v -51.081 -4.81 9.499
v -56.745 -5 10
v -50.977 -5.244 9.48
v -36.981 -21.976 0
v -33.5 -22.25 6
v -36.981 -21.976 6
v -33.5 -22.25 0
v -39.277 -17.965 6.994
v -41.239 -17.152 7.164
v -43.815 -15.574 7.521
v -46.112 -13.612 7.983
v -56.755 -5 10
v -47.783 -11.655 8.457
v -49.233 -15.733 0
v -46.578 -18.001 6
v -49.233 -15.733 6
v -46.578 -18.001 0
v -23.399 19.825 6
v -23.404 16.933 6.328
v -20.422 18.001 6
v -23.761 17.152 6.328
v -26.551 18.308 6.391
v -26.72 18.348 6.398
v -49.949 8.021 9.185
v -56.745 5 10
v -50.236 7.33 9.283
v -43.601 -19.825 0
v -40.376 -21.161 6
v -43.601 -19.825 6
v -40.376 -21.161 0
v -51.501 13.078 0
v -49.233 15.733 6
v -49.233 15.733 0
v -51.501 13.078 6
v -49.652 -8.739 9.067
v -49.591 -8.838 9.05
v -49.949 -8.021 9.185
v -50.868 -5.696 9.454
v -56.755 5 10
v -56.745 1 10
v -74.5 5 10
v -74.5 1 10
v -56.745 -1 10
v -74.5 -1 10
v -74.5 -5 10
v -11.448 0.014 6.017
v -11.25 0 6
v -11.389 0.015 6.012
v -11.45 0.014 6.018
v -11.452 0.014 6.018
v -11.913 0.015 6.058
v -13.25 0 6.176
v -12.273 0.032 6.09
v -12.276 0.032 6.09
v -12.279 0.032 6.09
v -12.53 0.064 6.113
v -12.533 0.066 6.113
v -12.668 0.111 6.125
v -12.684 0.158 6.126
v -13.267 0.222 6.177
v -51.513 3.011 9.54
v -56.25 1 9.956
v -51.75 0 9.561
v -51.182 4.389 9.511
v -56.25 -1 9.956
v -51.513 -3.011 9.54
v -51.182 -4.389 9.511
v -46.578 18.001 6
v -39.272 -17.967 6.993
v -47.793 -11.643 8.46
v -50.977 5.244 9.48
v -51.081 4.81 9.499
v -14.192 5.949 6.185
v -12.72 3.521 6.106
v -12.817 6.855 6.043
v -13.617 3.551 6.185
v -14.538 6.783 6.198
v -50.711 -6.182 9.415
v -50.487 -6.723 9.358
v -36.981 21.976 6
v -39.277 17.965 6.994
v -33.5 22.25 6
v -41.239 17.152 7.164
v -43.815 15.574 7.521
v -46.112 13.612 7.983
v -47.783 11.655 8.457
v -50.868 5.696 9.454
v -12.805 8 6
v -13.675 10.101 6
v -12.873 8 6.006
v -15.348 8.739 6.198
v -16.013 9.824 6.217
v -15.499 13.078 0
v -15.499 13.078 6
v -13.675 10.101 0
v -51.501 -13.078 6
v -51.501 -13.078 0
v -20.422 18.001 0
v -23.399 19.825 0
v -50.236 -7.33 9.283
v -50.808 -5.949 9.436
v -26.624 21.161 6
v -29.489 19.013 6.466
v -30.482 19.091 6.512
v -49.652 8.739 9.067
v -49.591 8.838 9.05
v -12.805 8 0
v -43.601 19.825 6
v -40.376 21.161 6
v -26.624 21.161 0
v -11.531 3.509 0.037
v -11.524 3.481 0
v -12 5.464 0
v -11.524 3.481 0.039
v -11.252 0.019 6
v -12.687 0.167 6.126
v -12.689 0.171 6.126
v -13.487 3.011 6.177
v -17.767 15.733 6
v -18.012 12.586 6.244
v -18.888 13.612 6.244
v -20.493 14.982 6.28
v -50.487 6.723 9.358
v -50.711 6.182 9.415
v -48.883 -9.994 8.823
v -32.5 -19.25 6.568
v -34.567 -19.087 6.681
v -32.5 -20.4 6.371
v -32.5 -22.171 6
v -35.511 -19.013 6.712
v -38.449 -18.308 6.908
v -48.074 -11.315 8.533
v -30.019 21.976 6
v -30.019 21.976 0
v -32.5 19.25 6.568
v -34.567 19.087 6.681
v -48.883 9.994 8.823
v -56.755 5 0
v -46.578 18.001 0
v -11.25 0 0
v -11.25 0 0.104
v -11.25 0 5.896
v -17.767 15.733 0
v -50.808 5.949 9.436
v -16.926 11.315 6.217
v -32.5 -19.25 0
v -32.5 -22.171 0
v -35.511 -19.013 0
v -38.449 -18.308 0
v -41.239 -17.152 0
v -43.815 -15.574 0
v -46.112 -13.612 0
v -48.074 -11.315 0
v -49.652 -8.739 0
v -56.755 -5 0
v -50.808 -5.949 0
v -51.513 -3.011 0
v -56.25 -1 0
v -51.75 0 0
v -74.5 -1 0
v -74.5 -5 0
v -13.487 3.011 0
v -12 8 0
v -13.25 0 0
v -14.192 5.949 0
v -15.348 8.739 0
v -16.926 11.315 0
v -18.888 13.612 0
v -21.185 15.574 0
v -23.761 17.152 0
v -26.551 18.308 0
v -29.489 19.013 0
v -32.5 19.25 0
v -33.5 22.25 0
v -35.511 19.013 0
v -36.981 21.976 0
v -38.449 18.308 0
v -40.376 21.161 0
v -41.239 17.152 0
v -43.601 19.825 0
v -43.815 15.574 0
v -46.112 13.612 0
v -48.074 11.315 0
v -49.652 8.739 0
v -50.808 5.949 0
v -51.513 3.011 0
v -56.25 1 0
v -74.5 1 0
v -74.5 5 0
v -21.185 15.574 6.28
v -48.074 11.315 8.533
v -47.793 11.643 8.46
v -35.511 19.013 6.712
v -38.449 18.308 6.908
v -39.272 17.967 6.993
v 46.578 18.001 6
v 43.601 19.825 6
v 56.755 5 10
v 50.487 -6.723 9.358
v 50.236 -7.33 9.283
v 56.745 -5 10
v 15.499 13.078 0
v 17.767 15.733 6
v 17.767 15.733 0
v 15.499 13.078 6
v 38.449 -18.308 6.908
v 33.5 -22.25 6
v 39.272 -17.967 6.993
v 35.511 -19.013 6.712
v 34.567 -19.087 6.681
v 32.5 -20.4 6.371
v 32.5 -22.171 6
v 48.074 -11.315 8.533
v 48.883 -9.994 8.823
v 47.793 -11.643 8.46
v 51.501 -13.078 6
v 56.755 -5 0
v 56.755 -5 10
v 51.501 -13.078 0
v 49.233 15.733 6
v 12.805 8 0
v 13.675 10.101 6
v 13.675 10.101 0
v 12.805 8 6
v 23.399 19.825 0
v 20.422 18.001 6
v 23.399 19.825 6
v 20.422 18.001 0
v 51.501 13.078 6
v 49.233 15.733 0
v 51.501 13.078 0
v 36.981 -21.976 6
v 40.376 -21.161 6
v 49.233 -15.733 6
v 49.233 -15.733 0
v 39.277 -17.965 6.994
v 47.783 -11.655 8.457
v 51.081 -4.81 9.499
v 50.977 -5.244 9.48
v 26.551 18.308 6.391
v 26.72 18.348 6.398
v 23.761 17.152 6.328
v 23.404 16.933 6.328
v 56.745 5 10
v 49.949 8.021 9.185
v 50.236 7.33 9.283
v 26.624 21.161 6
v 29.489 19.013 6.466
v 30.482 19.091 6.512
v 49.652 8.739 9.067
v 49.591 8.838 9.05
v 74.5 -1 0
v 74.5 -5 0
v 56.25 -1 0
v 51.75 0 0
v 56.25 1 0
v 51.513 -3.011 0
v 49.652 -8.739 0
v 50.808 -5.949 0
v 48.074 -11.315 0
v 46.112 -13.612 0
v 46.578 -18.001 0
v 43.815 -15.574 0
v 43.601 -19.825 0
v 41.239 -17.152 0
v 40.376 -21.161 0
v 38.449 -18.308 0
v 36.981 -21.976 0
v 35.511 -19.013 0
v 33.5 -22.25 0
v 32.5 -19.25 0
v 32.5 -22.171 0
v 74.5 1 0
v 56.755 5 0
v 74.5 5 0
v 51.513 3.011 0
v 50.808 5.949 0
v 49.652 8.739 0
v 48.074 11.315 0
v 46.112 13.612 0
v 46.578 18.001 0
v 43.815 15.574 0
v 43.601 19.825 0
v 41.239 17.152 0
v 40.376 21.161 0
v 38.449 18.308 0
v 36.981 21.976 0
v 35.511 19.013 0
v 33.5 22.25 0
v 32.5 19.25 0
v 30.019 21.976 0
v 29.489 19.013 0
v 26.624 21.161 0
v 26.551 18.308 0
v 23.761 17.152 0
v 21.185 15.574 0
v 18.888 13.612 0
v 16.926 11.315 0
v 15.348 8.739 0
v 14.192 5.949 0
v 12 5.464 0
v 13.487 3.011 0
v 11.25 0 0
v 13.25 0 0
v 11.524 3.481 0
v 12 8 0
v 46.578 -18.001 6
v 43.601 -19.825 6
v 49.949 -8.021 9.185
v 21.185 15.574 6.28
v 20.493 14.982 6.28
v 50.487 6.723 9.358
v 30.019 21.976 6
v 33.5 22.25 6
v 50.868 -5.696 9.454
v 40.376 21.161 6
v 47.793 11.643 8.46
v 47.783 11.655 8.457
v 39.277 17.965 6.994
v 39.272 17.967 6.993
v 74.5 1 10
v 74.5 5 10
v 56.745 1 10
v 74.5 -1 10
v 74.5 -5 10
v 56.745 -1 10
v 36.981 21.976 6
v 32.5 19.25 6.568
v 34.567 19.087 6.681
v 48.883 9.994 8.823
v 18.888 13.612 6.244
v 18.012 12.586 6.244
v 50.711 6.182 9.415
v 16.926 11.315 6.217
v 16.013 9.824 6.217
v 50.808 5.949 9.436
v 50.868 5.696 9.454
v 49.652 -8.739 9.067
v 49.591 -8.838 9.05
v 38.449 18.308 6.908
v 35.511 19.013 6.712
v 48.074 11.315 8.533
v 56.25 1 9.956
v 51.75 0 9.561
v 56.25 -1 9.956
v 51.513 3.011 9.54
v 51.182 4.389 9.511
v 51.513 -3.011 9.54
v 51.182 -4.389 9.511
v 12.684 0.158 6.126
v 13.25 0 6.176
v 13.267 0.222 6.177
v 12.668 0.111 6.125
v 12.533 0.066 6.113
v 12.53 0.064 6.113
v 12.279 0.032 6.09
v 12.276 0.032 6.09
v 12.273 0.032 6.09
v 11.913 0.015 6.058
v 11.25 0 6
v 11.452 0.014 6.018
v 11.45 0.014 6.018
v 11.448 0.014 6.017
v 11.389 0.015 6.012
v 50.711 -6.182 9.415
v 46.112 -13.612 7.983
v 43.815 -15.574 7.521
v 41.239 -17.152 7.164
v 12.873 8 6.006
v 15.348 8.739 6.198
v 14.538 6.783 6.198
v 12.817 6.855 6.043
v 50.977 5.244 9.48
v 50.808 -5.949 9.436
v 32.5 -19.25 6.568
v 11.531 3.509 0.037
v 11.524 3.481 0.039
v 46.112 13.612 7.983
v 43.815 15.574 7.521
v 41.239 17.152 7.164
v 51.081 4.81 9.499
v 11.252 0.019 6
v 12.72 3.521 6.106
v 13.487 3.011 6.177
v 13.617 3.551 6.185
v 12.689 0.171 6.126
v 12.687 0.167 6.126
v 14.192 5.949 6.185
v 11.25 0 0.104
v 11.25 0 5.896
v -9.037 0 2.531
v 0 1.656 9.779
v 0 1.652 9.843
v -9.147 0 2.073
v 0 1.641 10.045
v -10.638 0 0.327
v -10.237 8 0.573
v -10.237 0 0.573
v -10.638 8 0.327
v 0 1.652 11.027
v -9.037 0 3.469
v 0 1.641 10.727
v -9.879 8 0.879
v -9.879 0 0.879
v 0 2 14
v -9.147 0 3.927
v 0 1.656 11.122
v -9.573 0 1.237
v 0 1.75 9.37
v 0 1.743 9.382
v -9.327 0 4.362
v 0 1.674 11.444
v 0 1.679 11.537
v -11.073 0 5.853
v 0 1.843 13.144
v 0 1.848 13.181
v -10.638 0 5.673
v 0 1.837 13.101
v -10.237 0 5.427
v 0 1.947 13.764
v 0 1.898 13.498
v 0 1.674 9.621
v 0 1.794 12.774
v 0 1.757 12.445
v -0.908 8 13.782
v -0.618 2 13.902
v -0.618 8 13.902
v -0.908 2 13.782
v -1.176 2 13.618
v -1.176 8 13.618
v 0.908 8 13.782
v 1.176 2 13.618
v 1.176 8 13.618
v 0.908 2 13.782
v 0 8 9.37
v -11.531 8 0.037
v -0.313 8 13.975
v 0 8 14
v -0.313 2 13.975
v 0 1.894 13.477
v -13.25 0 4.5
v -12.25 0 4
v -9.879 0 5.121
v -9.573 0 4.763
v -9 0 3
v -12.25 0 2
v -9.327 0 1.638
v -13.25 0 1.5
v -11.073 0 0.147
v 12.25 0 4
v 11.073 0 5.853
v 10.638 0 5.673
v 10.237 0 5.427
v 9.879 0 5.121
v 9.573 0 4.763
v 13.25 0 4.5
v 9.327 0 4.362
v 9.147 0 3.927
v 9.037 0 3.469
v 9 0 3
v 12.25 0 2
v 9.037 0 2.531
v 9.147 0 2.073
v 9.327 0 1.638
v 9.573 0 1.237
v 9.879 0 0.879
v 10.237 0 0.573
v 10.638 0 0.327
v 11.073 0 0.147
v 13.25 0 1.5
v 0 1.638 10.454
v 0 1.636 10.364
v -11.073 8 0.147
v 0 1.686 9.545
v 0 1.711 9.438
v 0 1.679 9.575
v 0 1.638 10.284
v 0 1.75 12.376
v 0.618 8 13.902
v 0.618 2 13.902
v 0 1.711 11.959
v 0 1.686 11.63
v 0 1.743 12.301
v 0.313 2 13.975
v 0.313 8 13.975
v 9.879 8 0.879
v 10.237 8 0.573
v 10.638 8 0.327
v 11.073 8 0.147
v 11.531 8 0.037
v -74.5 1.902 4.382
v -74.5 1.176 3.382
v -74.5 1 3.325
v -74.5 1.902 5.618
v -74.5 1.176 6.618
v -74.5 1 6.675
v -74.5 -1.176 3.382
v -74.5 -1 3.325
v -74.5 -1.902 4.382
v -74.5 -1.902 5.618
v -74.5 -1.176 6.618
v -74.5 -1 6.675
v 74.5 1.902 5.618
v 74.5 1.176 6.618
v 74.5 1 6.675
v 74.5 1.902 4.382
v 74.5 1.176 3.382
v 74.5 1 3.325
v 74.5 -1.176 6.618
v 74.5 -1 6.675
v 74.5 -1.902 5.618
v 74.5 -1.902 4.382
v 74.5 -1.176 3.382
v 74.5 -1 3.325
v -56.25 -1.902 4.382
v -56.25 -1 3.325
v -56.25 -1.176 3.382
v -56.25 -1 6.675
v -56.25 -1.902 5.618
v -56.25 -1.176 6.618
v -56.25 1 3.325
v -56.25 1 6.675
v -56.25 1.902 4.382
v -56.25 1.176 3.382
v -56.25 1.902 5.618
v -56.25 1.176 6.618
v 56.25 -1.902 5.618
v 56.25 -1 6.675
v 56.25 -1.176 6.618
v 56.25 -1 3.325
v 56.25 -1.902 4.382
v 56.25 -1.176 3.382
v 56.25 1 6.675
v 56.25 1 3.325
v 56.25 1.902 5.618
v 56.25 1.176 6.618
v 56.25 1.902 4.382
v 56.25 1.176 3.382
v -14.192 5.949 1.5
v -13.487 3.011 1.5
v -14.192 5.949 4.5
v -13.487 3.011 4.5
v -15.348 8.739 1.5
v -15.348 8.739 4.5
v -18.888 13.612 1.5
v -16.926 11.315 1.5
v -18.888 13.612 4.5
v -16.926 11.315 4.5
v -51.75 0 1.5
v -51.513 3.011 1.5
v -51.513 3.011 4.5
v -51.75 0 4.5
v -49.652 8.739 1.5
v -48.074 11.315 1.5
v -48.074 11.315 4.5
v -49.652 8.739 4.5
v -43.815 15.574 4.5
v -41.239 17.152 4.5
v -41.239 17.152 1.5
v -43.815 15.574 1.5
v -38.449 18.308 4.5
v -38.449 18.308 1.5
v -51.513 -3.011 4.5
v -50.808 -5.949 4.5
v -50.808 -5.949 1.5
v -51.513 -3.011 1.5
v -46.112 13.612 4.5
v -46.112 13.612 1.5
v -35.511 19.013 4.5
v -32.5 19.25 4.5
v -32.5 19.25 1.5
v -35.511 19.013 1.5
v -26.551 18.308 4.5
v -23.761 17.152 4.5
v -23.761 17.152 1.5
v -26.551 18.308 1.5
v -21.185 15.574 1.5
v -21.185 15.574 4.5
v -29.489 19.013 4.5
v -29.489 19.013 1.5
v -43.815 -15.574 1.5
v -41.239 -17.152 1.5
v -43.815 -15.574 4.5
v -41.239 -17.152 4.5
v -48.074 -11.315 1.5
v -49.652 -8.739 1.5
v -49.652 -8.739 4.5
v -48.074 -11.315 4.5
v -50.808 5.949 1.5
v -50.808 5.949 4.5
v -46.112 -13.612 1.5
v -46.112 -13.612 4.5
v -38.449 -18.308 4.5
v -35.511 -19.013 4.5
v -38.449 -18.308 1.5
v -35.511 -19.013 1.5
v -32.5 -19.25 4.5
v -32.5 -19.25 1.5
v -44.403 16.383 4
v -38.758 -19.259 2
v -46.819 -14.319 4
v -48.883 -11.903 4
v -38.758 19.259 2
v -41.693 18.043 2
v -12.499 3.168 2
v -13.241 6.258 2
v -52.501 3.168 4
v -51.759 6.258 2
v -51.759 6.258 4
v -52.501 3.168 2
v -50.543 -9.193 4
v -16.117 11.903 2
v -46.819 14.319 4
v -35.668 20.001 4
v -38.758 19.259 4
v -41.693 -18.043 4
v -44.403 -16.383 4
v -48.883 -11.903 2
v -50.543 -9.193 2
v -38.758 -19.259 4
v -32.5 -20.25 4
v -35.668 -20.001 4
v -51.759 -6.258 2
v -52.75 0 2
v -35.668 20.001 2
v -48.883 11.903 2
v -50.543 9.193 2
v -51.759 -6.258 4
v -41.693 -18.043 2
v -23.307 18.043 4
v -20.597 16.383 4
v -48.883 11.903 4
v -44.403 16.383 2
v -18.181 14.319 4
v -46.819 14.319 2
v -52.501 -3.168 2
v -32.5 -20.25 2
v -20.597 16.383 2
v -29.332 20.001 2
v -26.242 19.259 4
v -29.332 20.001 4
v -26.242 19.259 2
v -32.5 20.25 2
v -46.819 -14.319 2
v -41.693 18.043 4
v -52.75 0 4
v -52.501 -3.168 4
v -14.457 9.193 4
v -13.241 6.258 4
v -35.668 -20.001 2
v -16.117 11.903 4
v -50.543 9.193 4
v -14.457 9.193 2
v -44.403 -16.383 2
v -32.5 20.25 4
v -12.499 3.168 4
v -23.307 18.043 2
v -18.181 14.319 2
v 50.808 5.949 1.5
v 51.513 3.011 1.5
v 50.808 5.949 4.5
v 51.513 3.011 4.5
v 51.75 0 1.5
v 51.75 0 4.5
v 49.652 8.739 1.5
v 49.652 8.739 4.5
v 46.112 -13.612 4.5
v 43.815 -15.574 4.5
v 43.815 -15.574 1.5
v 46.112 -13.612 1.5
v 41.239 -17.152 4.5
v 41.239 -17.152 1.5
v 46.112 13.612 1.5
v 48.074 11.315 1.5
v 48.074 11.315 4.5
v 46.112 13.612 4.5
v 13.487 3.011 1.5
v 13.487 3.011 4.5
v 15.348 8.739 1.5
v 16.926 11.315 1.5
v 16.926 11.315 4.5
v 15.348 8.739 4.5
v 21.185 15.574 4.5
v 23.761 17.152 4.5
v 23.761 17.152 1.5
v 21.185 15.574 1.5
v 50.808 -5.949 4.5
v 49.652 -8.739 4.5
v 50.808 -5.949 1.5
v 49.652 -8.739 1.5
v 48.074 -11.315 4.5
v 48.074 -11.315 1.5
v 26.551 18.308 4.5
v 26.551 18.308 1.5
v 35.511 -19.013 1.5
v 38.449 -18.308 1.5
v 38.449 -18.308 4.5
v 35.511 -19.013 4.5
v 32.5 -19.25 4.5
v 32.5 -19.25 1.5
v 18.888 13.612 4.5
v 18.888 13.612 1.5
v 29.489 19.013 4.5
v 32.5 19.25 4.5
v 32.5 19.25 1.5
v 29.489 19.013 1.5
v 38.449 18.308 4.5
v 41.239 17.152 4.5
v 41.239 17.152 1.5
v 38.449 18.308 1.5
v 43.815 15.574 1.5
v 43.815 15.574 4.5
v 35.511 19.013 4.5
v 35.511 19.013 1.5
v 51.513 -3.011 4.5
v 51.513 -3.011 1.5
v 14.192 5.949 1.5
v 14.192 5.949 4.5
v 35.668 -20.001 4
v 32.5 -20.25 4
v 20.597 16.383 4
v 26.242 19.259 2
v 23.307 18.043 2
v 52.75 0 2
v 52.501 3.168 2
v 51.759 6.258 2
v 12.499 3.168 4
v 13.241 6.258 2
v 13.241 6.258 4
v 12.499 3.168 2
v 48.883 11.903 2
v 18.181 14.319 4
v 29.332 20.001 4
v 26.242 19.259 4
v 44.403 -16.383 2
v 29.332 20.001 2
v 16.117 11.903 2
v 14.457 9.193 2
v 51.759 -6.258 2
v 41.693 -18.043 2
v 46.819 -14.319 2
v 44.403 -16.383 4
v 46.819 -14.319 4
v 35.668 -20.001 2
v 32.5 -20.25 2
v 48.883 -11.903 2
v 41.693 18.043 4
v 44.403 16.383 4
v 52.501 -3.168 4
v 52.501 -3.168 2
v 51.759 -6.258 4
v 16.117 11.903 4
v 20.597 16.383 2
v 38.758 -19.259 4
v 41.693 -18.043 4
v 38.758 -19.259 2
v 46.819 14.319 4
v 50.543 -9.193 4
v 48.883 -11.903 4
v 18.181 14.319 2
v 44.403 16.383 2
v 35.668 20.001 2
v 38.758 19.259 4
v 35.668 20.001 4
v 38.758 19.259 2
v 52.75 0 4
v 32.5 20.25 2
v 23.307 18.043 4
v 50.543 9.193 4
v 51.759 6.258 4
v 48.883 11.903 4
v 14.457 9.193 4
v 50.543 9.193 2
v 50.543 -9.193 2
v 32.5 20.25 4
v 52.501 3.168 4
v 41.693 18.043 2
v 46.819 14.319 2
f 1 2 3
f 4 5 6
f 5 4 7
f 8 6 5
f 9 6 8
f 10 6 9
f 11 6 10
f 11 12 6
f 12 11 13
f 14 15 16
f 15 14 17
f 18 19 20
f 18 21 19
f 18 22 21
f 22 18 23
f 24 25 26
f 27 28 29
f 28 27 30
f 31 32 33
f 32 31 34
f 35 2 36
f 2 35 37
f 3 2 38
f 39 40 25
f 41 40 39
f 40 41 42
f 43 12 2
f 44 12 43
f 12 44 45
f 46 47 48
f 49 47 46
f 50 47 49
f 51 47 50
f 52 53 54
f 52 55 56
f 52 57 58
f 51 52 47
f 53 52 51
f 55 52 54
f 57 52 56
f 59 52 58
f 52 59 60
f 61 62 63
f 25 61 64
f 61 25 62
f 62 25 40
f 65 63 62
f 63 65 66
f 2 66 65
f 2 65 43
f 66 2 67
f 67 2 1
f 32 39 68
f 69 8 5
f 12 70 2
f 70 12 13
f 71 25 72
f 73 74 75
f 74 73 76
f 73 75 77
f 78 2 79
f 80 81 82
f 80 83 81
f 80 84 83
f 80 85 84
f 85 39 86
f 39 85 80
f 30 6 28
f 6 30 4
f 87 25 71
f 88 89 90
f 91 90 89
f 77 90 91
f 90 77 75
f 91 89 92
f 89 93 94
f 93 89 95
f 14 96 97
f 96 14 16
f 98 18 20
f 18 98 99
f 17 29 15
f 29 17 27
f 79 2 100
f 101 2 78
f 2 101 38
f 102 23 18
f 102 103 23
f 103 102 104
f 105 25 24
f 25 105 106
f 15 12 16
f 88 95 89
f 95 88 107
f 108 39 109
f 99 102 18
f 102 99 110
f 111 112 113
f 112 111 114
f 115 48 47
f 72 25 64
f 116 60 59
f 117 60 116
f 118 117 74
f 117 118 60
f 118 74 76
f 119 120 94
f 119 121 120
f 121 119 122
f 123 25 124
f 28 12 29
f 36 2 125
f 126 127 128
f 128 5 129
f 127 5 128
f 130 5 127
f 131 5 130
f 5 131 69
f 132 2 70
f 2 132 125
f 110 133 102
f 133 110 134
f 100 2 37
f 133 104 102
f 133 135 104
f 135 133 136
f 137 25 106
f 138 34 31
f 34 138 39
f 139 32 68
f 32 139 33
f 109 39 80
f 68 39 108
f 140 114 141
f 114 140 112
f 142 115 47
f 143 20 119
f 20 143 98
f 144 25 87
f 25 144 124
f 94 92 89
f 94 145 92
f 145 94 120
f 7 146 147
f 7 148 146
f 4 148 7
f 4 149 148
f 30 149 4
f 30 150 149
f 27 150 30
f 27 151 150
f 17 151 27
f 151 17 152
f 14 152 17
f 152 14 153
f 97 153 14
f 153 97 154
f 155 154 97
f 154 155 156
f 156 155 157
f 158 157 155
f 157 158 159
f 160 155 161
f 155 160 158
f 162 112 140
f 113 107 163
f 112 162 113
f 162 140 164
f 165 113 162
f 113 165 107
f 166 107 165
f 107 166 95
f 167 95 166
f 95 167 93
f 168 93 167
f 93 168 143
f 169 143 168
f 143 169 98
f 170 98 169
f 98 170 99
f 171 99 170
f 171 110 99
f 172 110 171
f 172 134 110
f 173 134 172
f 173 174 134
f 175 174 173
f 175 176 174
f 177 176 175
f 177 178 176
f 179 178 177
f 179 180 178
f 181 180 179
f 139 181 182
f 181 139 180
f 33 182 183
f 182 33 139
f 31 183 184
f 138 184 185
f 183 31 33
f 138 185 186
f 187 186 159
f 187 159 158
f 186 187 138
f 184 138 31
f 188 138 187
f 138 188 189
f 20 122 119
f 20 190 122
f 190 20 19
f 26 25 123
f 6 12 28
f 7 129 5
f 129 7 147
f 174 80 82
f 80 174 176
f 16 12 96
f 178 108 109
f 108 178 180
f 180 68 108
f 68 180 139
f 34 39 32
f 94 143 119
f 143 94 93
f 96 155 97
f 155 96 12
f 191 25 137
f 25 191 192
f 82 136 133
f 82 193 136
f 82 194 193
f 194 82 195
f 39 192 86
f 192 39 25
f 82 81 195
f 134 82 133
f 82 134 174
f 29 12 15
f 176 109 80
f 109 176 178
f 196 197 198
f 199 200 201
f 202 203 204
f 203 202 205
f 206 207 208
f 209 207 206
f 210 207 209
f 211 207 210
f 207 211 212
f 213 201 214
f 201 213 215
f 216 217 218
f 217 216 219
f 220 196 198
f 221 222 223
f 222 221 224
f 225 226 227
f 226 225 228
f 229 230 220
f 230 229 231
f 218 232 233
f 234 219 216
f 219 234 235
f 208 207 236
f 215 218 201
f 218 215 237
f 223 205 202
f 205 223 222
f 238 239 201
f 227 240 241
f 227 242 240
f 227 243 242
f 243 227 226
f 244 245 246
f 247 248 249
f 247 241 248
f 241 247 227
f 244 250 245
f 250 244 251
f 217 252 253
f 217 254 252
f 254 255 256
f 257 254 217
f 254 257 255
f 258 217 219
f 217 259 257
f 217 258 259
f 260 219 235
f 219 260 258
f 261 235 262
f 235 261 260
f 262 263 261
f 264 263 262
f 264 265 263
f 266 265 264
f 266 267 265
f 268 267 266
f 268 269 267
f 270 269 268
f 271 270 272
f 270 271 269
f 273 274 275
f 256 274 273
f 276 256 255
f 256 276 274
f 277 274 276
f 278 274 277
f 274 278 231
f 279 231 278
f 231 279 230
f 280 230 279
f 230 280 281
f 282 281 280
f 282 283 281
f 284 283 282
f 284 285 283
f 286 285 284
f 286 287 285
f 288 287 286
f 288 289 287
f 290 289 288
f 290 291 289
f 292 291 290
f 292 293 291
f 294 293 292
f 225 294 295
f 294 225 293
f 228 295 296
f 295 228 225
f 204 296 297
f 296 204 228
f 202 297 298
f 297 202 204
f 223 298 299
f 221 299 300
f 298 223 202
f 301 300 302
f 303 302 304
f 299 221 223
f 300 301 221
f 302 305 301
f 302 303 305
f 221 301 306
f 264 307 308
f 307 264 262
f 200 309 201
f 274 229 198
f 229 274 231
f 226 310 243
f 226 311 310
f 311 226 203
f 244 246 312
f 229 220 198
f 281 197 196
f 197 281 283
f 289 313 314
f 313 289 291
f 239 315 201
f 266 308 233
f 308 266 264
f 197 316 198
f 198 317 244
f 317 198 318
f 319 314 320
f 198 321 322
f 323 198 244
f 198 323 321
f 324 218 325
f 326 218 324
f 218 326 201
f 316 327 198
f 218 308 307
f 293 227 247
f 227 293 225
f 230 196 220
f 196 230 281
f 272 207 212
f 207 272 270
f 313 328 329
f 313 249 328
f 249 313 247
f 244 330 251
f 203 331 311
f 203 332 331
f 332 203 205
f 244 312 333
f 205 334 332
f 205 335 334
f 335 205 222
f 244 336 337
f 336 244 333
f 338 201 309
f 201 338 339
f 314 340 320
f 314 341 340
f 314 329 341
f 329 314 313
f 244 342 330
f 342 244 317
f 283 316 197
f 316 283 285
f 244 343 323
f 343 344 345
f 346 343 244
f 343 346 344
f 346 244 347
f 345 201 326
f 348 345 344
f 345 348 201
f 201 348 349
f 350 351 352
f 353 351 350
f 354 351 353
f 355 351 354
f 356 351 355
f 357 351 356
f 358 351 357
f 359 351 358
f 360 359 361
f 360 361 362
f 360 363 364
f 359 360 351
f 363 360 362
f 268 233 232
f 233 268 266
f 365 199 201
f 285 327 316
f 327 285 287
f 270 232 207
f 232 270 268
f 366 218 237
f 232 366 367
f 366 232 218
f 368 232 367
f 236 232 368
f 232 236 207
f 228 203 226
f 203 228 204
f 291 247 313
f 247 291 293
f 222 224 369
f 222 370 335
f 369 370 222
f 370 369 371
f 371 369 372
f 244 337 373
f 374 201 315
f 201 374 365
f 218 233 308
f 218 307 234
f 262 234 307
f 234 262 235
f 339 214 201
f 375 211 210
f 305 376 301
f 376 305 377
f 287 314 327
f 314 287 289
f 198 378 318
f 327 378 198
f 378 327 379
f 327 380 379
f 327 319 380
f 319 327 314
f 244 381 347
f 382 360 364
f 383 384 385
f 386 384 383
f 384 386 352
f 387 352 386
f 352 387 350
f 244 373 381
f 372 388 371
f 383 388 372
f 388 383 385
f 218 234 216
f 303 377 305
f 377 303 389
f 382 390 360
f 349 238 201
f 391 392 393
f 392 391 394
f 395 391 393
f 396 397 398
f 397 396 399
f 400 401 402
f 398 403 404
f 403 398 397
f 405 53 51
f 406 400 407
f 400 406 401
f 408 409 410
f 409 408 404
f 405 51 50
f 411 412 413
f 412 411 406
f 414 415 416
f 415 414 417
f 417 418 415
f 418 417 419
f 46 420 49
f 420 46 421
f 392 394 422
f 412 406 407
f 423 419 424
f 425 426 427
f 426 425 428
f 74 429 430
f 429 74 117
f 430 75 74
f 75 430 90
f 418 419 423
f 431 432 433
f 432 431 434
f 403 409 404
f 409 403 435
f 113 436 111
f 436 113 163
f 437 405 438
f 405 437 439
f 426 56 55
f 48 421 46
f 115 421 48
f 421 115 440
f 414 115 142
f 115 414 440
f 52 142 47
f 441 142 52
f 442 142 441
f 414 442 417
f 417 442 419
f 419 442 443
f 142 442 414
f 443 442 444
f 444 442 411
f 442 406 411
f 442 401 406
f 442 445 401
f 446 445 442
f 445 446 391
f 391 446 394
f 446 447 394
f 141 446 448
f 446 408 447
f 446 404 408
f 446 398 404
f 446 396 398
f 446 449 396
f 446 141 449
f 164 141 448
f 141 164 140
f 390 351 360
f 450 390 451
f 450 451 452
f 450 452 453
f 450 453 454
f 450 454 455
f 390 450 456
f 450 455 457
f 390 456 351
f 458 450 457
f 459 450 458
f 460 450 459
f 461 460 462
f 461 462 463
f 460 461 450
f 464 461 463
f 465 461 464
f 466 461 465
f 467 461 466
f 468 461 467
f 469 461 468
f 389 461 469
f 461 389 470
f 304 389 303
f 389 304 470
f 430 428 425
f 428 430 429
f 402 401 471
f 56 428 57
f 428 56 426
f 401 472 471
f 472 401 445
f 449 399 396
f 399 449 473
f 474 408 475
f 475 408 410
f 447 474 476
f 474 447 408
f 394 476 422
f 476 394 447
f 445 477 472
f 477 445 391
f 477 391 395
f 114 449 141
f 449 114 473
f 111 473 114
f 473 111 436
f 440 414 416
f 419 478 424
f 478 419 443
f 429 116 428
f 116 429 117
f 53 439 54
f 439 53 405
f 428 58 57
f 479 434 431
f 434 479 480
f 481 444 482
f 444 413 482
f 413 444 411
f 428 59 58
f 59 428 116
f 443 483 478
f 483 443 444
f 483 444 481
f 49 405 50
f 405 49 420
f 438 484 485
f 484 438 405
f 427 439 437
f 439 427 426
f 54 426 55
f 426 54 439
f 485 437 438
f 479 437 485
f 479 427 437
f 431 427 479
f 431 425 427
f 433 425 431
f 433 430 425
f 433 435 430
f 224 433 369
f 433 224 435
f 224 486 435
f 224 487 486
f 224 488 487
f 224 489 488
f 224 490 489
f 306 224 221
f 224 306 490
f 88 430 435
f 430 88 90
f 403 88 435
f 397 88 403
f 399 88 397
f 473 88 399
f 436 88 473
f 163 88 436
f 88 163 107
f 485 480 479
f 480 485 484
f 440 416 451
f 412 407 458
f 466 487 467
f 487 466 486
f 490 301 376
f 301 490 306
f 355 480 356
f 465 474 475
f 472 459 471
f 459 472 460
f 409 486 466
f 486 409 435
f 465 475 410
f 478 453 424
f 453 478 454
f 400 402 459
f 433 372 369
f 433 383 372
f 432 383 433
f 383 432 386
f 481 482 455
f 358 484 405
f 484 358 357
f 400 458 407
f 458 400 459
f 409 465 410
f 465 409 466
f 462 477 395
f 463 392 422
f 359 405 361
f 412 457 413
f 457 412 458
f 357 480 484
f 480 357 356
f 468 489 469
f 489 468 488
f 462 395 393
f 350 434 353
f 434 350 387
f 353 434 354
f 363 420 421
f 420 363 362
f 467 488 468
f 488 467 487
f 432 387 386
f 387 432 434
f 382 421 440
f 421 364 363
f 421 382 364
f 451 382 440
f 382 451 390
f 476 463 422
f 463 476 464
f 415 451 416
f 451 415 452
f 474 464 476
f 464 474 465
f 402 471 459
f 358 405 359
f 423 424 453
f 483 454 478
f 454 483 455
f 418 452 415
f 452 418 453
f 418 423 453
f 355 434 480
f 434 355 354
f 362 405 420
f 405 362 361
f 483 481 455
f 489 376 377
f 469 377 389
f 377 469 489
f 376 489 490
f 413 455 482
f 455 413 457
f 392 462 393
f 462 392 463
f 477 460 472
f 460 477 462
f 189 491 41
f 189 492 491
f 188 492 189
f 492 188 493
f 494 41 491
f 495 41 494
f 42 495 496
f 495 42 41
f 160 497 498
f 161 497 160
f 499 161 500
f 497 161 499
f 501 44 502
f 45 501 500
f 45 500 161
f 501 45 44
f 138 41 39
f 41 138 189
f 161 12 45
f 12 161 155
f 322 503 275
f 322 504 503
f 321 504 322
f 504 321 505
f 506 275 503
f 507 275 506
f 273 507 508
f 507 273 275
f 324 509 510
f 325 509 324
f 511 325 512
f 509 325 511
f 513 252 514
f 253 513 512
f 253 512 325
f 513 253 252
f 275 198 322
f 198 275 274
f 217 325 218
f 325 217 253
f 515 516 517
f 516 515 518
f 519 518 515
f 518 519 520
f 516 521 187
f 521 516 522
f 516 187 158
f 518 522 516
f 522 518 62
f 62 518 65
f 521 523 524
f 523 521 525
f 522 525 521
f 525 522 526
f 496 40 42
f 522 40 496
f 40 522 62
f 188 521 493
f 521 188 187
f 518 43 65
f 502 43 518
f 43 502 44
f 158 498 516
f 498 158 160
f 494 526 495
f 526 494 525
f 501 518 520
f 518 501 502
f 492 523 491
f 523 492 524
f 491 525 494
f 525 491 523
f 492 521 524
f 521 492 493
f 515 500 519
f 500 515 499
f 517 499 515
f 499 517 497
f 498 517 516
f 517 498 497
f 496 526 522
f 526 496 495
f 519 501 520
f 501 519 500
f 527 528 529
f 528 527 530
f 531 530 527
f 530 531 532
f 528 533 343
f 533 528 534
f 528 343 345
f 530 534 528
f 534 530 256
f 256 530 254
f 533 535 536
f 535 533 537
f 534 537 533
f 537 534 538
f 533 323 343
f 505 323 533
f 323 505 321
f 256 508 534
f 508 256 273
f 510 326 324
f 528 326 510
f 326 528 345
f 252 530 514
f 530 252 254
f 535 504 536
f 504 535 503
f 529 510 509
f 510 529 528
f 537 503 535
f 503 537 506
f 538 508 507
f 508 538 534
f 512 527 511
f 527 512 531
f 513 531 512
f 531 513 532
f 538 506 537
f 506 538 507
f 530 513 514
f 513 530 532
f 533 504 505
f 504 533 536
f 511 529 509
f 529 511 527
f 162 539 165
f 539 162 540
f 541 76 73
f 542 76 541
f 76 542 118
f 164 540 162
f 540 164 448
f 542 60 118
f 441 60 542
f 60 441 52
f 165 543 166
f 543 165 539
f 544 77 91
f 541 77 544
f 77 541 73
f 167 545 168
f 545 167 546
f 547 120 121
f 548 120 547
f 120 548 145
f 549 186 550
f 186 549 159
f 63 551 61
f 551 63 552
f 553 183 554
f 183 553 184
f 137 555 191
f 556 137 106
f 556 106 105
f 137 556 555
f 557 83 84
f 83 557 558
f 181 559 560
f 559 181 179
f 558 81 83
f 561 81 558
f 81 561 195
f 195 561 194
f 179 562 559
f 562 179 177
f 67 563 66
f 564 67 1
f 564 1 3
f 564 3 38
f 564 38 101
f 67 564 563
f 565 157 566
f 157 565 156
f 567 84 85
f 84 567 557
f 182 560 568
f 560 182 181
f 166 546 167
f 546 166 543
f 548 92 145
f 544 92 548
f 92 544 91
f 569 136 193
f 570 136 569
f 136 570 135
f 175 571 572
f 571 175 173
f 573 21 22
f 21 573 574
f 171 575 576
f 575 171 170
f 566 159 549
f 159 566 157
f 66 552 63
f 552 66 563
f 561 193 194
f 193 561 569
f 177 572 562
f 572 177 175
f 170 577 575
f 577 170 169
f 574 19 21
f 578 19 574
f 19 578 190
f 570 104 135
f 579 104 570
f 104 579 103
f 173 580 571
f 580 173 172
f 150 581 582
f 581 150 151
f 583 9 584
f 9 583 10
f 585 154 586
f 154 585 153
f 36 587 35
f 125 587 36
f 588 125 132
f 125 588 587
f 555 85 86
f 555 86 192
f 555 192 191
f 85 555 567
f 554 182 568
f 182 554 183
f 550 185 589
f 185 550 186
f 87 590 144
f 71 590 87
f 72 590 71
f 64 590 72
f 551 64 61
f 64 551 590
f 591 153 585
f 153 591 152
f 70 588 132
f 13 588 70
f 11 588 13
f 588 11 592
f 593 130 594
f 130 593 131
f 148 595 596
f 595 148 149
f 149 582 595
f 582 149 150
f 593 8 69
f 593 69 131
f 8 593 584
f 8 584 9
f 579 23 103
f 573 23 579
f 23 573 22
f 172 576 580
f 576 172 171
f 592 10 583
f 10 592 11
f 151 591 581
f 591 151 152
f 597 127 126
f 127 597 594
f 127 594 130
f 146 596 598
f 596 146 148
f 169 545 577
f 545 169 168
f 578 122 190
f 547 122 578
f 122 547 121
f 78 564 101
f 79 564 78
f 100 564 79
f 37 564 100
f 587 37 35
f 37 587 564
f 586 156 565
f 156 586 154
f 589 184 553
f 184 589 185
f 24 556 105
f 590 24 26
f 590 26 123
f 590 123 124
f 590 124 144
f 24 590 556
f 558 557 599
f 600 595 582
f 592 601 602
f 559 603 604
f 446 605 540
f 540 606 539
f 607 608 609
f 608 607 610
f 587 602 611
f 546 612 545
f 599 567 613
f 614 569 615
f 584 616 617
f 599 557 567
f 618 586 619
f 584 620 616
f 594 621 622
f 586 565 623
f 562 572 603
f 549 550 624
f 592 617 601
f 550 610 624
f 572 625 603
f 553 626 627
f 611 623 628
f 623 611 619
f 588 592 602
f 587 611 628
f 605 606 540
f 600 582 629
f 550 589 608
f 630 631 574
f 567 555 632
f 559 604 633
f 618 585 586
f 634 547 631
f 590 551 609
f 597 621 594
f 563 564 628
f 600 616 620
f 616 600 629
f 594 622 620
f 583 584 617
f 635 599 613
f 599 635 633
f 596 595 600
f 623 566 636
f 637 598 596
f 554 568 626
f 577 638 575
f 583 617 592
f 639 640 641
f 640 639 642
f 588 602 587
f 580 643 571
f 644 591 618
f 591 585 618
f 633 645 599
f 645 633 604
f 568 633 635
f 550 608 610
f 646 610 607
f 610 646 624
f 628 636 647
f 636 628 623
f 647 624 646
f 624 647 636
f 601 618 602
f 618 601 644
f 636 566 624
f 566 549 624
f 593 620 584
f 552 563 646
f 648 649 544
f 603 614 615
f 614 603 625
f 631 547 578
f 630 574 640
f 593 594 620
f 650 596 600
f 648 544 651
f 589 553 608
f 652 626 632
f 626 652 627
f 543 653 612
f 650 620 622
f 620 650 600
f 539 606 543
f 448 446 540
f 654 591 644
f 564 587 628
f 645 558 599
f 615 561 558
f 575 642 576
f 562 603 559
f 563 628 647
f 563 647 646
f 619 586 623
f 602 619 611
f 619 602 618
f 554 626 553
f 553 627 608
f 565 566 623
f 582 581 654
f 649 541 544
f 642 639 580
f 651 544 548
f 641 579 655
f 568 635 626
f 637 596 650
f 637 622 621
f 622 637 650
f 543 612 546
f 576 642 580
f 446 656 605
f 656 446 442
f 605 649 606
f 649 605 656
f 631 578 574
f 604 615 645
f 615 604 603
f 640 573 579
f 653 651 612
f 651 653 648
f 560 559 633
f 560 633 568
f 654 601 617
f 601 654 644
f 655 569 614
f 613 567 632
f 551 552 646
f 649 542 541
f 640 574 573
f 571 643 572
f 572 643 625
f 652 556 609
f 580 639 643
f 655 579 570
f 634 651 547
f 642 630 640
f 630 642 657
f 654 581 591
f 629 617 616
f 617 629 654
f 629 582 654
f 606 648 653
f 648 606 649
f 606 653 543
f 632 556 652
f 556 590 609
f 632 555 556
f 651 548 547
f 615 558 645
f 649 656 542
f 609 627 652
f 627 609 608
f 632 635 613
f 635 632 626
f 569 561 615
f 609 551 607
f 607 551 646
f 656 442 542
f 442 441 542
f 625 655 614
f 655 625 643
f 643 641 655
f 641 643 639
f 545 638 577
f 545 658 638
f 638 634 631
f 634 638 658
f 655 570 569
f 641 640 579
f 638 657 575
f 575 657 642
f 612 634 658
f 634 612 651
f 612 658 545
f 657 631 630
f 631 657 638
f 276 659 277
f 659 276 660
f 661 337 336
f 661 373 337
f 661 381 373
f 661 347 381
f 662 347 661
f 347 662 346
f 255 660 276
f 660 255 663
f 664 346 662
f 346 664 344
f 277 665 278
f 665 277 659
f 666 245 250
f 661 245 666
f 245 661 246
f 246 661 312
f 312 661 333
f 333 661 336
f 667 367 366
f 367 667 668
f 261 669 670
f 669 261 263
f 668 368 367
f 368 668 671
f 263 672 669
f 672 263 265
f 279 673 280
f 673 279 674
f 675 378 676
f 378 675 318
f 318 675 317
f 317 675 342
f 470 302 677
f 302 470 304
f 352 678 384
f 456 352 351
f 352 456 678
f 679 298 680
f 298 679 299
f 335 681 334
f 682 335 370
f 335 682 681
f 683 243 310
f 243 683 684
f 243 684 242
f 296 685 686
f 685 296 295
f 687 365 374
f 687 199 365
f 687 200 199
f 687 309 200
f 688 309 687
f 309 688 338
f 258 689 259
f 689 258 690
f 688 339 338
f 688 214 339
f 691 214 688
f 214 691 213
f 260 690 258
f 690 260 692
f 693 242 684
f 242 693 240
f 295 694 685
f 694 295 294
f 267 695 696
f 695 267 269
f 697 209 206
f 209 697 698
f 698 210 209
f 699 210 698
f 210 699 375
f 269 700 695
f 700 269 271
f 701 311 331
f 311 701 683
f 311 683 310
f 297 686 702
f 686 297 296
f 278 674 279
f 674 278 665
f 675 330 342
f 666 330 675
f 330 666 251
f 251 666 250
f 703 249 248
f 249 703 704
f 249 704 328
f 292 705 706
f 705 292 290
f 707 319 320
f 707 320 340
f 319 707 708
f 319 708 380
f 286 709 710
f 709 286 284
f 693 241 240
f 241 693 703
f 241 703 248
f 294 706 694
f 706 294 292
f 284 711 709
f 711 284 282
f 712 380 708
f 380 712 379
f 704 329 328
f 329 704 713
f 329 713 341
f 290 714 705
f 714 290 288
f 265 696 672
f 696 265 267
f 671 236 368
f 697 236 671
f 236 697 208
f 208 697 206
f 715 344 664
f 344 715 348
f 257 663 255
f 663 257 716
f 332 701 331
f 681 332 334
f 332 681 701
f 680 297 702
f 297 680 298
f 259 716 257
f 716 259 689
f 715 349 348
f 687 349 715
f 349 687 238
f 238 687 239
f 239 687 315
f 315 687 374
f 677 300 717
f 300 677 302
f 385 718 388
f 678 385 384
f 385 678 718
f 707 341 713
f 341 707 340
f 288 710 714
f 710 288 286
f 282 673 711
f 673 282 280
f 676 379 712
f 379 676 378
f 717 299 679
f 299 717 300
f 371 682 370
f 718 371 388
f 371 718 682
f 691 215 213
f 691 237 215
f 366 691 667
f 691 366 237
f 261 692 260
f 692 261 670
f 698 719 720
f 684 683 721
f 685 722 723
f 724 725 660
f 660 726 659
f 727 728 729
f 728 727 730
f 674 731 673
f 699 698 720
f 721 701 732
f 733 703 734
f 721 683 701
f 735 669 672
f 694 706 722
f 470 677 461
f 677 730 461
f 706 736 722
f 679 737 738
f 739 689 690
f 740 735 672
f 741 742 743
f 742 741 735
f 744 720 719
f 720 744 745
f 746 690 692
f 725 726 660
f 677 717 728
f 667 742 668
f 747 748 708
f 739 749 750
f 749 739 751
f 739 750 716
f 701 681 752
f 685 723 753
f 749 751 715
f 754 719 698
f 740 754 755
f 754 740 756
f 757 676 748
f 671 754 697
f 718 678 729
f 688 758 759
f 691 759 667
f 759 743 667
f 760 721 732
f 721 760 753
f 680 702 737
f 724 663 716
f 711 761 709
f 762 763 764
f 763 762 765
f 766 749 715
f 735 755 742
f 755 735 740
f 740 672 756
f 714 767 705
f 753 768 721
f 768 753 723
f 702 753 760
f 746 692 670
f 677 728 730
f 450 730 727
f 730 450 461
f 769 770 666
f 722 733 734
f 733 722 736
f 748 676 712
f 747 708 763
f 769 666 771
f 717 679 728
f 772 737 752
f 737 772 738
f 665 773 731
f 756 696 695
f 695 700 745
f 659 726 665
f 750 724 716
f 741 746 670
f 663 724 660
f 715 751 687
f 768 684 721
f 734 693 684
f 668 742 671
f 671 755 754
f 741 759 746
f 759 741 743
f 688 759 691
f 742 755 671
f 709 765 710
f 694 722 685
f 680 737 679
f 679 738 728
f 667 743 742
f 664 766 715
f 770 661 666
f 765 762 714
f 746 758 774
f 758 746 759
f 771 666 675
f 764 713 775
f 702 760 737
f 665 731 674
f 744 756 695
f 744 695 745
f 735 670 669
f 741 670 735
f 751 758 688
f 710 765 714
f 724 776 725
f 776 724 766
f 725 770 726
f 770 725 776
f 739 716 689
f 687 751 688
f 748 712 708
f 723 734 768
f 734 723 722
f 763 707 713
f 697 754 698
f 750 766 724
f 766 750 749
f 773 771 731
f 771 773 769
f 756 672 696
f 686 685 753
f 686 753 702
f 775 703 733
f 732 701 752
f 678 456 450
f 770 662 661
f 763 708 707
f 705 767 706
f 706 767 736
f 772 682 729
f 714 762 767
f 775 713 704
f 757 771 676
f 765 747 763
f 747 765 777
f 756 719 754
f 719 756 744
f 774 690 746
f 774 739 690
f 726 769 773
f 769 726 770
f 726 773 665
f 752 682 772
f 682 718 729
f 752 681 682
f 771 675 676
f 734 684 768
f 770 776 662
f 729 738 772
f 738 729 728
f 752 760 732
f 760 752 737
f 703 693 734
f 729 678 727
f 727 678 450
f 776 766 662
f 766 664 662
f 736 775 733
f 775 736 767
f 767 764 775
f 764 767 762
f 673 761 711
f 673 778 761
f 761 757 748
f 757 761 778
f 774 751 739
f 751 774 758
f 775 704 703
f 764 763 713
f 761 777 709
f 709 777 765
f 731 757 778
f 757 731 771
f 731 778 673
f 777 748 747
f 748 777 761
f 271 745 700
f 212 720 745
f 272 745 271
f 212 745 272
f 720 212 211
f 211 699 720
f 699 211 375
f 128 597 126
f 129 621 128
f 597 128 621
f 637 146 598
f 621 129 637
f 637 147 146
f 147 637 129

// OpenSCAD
// parametric lens holder for Note4 VR OpenDive Headset (and others)

// Single- or Dual- lens model?
part = "single"; // [single:Single Lens,dual:Dual Lens]

// Inter-Pupillary Distance
IPD = 65; // Inter-Pupillary Distance. How far apart the center of the two lenses will be
// Diameter of lens #1 (single and dual)
lensSize1 = 40.5; // diameter of one of the lenses you are using
// Diameter of lens #2 (single and dual)
lensSize2 = 40.5; // diameter of the second lens you are using
// Diameter of lens #3 (dual only)
lensSize3 = 40.5; // diameter of the third lens you are using
// Diameter of lens #4 (dual only)
lensSize4 = 40.5; // diameter of the fourth lens you are using
// Gap between dual lenses (dual only)
lensGap = 11; // gap between first and second lens (center-to-center)
// Width of the VR visor being used.
visorWidth = 149; // outer width of the visor.  this is how wide the lens clip will be
// Width of slots within the VR visor
slotWidth = 10; // how wide the slots for the lens clip are
// Thickness of single lenses
lensThickness = 2; // how thick the edges of the lenses are
// Thickness of secondary lenses
lensThickness2 = 2; // how thick the edges of the secondary lenses are

/* [Hidden] */
$fn=40;
lensLip = 1; // how big the rim of plastic holding the lens in will be
mountStart = (IPD+(lensSize1 + lensSize2)/2)/2 + 4; // an intermediate value
mountMid = (visorWidth/2-mountStart)/2 + mountStart;

lensThicknessAvg = (lensThickness + lensThickness2) / 2; // just to simplify dual
        
lensClip(part);

module lensClip(part)
{
	difference ()
	{
		union()
		{
            // lens outers
            if (part == "single")
            {
                hull()
                {
                    translate([-(IPD/2+1),0,lensThickness/2 + 2])	cylinder(r=lensSize1/2 + 2, h=lensThickness + 4, center=true);
                    translate([-mountStart, 0, 5]) cube([.01, slotWidth, 10], center=true);
                }

                hull()
                {
                    translate([(IPD/2+1),0,lensThickness/2 + 2])	cylinder(r=lensSize2/2 + 2, h=lensThickness +4, center=true);
                    translate([mountStart, 0, 5]) cube([.01, slotWidth, 10], center=true);
                }
            }
            else
            {
                hull()
                {
                    translate([-(IPD/2+1),0,(lensThicknessAvg/2 + 2) + lensGap/2])	cylinder(r=lensSize1/2 + 2, h=(lensThicknessAvg + 4) + lensGap, center=true);
                    translate([-mountStart, 0, 5]) cube([.01, slotWidth, 10], center=true);
                }

                hull()
                {
                    translate([(IPD/2+1),0,(lensThicknessAvg/2 + 2) + lensGap/2])	cylinder(r=lensSize2/2 + 2, h=(lensThicknessAvg + 4) + lensGap, center=true);
                    translate([mountStart, 0, 5]) cube([.01, slotWidth, 10], center=true);
                }
            }
            
            
            translate([-mountMid, 0, 5]) cube([visorWidth/2 - mountStart, slotWidth, 10], center=true);
			translate([mountMid, 0, 5]) cube([visorWidth/2 - mountStart, slotWidth, 10], center=true);
			
			// crosspiece (lighter for single than for dual)
            if (part == "single") 
            {
                hull()
                {
                    translate([0, 5, 12]) rotate([90,0,0]) cylinder(r=2,h=6,center=true);
                    translate([-12, 4, 3]) rotate([90,0,0]) cylinder(r=3,h=8,center=true);
                }
                hull()
                {
                    translate([0, 5, 12]) rotate([90,0,0]) cylinder(r=2,h=6,center=true);
                    translate([12, 4, 3]) rotate([90,0,0]) cylinder(r=3,h=8,center=true);
                }
            }
            else
            {
                hull()
                {
                    translate([0, 5, 12]) rotate([90,0,0]) cylinder(r=3,h=6,center=true);
                    translate([-12.5, 4, 4]) rotate([90,0,0]) cylinder(r=4,h=8,center=true);
                }
                hull()
                {
                    translate([0, 5, 12]) rotate([90,0,0]) cylinder(r=3,h=6,center=true);
                    translate([12.5, 4, 4]) rotate([90,0,0]) cylinder(r=4,h=8,center=true);
                }
            }
			translate([-(IPD/4 + 6),4,3]) cube([IPD/2-12,8,6], center=true);
			translate([(IPD/4 + 6),4,3]) cube([IPD/2-12,8,6], center=true);
		}
	
	// slot mount cutouts
	translate ([-mountMid, 0, 5])
	{
		cube([visorWidth/2 - mountStart + 1, 2, 11],center=true);
		rotate([0,90,0]) cylinder(r=2, h=visorWidth/2 - mountStart + 1, center=true, $fn=10);
	}

	translate ([mountMid, 0, 5])
	{
		cube([visorWidth/2 - mountStart + 1, 2, 11],center=true);
		rotate([0,90,0]) cylinder(r=2, h=visorWidth/2 - mountStart + 1, center=true, $fn=10);
	}
	// lens cutouts
	translate ([-IPD/2,0,lensThickness/2 + 2]) lensCutOut(lensSize1,lensThickness);
	translate ([IPD/2,0,lensThickness/2 + 2]) lensCutOut(lensSize2,lensThickness);
    
    // secondary lens cutouts
    if (part == "dual")
    {
        translate ([-IPD/2,0,(lensThickness/2 + 2) + lensGap]) lensCutOut(lensSize3,lensThickness2);
        translate ([IPD/2,0,(lensThickness/2 + 2) + lensGap]) lensCutOut(lensSize4,lensThickness2);
    }
	
	// lens gap
	translate([0,-50,3]) cube([IPD,100,50], center=true);

	}
}

module lensCutOut(lensSize,lensThickness)
{
	union()
	{
		cylinder(r=lensSize/2 - lensLip, h=100, center=true);
		
		// creating a bevel
		hull()
		{
			cylinder(r=lensSize/2, h=lensThickness, center=true);
			cylinder(r=lensSize/2-lensLip, h=lensThickness + lensLip, center=true);
		}
	}
}
